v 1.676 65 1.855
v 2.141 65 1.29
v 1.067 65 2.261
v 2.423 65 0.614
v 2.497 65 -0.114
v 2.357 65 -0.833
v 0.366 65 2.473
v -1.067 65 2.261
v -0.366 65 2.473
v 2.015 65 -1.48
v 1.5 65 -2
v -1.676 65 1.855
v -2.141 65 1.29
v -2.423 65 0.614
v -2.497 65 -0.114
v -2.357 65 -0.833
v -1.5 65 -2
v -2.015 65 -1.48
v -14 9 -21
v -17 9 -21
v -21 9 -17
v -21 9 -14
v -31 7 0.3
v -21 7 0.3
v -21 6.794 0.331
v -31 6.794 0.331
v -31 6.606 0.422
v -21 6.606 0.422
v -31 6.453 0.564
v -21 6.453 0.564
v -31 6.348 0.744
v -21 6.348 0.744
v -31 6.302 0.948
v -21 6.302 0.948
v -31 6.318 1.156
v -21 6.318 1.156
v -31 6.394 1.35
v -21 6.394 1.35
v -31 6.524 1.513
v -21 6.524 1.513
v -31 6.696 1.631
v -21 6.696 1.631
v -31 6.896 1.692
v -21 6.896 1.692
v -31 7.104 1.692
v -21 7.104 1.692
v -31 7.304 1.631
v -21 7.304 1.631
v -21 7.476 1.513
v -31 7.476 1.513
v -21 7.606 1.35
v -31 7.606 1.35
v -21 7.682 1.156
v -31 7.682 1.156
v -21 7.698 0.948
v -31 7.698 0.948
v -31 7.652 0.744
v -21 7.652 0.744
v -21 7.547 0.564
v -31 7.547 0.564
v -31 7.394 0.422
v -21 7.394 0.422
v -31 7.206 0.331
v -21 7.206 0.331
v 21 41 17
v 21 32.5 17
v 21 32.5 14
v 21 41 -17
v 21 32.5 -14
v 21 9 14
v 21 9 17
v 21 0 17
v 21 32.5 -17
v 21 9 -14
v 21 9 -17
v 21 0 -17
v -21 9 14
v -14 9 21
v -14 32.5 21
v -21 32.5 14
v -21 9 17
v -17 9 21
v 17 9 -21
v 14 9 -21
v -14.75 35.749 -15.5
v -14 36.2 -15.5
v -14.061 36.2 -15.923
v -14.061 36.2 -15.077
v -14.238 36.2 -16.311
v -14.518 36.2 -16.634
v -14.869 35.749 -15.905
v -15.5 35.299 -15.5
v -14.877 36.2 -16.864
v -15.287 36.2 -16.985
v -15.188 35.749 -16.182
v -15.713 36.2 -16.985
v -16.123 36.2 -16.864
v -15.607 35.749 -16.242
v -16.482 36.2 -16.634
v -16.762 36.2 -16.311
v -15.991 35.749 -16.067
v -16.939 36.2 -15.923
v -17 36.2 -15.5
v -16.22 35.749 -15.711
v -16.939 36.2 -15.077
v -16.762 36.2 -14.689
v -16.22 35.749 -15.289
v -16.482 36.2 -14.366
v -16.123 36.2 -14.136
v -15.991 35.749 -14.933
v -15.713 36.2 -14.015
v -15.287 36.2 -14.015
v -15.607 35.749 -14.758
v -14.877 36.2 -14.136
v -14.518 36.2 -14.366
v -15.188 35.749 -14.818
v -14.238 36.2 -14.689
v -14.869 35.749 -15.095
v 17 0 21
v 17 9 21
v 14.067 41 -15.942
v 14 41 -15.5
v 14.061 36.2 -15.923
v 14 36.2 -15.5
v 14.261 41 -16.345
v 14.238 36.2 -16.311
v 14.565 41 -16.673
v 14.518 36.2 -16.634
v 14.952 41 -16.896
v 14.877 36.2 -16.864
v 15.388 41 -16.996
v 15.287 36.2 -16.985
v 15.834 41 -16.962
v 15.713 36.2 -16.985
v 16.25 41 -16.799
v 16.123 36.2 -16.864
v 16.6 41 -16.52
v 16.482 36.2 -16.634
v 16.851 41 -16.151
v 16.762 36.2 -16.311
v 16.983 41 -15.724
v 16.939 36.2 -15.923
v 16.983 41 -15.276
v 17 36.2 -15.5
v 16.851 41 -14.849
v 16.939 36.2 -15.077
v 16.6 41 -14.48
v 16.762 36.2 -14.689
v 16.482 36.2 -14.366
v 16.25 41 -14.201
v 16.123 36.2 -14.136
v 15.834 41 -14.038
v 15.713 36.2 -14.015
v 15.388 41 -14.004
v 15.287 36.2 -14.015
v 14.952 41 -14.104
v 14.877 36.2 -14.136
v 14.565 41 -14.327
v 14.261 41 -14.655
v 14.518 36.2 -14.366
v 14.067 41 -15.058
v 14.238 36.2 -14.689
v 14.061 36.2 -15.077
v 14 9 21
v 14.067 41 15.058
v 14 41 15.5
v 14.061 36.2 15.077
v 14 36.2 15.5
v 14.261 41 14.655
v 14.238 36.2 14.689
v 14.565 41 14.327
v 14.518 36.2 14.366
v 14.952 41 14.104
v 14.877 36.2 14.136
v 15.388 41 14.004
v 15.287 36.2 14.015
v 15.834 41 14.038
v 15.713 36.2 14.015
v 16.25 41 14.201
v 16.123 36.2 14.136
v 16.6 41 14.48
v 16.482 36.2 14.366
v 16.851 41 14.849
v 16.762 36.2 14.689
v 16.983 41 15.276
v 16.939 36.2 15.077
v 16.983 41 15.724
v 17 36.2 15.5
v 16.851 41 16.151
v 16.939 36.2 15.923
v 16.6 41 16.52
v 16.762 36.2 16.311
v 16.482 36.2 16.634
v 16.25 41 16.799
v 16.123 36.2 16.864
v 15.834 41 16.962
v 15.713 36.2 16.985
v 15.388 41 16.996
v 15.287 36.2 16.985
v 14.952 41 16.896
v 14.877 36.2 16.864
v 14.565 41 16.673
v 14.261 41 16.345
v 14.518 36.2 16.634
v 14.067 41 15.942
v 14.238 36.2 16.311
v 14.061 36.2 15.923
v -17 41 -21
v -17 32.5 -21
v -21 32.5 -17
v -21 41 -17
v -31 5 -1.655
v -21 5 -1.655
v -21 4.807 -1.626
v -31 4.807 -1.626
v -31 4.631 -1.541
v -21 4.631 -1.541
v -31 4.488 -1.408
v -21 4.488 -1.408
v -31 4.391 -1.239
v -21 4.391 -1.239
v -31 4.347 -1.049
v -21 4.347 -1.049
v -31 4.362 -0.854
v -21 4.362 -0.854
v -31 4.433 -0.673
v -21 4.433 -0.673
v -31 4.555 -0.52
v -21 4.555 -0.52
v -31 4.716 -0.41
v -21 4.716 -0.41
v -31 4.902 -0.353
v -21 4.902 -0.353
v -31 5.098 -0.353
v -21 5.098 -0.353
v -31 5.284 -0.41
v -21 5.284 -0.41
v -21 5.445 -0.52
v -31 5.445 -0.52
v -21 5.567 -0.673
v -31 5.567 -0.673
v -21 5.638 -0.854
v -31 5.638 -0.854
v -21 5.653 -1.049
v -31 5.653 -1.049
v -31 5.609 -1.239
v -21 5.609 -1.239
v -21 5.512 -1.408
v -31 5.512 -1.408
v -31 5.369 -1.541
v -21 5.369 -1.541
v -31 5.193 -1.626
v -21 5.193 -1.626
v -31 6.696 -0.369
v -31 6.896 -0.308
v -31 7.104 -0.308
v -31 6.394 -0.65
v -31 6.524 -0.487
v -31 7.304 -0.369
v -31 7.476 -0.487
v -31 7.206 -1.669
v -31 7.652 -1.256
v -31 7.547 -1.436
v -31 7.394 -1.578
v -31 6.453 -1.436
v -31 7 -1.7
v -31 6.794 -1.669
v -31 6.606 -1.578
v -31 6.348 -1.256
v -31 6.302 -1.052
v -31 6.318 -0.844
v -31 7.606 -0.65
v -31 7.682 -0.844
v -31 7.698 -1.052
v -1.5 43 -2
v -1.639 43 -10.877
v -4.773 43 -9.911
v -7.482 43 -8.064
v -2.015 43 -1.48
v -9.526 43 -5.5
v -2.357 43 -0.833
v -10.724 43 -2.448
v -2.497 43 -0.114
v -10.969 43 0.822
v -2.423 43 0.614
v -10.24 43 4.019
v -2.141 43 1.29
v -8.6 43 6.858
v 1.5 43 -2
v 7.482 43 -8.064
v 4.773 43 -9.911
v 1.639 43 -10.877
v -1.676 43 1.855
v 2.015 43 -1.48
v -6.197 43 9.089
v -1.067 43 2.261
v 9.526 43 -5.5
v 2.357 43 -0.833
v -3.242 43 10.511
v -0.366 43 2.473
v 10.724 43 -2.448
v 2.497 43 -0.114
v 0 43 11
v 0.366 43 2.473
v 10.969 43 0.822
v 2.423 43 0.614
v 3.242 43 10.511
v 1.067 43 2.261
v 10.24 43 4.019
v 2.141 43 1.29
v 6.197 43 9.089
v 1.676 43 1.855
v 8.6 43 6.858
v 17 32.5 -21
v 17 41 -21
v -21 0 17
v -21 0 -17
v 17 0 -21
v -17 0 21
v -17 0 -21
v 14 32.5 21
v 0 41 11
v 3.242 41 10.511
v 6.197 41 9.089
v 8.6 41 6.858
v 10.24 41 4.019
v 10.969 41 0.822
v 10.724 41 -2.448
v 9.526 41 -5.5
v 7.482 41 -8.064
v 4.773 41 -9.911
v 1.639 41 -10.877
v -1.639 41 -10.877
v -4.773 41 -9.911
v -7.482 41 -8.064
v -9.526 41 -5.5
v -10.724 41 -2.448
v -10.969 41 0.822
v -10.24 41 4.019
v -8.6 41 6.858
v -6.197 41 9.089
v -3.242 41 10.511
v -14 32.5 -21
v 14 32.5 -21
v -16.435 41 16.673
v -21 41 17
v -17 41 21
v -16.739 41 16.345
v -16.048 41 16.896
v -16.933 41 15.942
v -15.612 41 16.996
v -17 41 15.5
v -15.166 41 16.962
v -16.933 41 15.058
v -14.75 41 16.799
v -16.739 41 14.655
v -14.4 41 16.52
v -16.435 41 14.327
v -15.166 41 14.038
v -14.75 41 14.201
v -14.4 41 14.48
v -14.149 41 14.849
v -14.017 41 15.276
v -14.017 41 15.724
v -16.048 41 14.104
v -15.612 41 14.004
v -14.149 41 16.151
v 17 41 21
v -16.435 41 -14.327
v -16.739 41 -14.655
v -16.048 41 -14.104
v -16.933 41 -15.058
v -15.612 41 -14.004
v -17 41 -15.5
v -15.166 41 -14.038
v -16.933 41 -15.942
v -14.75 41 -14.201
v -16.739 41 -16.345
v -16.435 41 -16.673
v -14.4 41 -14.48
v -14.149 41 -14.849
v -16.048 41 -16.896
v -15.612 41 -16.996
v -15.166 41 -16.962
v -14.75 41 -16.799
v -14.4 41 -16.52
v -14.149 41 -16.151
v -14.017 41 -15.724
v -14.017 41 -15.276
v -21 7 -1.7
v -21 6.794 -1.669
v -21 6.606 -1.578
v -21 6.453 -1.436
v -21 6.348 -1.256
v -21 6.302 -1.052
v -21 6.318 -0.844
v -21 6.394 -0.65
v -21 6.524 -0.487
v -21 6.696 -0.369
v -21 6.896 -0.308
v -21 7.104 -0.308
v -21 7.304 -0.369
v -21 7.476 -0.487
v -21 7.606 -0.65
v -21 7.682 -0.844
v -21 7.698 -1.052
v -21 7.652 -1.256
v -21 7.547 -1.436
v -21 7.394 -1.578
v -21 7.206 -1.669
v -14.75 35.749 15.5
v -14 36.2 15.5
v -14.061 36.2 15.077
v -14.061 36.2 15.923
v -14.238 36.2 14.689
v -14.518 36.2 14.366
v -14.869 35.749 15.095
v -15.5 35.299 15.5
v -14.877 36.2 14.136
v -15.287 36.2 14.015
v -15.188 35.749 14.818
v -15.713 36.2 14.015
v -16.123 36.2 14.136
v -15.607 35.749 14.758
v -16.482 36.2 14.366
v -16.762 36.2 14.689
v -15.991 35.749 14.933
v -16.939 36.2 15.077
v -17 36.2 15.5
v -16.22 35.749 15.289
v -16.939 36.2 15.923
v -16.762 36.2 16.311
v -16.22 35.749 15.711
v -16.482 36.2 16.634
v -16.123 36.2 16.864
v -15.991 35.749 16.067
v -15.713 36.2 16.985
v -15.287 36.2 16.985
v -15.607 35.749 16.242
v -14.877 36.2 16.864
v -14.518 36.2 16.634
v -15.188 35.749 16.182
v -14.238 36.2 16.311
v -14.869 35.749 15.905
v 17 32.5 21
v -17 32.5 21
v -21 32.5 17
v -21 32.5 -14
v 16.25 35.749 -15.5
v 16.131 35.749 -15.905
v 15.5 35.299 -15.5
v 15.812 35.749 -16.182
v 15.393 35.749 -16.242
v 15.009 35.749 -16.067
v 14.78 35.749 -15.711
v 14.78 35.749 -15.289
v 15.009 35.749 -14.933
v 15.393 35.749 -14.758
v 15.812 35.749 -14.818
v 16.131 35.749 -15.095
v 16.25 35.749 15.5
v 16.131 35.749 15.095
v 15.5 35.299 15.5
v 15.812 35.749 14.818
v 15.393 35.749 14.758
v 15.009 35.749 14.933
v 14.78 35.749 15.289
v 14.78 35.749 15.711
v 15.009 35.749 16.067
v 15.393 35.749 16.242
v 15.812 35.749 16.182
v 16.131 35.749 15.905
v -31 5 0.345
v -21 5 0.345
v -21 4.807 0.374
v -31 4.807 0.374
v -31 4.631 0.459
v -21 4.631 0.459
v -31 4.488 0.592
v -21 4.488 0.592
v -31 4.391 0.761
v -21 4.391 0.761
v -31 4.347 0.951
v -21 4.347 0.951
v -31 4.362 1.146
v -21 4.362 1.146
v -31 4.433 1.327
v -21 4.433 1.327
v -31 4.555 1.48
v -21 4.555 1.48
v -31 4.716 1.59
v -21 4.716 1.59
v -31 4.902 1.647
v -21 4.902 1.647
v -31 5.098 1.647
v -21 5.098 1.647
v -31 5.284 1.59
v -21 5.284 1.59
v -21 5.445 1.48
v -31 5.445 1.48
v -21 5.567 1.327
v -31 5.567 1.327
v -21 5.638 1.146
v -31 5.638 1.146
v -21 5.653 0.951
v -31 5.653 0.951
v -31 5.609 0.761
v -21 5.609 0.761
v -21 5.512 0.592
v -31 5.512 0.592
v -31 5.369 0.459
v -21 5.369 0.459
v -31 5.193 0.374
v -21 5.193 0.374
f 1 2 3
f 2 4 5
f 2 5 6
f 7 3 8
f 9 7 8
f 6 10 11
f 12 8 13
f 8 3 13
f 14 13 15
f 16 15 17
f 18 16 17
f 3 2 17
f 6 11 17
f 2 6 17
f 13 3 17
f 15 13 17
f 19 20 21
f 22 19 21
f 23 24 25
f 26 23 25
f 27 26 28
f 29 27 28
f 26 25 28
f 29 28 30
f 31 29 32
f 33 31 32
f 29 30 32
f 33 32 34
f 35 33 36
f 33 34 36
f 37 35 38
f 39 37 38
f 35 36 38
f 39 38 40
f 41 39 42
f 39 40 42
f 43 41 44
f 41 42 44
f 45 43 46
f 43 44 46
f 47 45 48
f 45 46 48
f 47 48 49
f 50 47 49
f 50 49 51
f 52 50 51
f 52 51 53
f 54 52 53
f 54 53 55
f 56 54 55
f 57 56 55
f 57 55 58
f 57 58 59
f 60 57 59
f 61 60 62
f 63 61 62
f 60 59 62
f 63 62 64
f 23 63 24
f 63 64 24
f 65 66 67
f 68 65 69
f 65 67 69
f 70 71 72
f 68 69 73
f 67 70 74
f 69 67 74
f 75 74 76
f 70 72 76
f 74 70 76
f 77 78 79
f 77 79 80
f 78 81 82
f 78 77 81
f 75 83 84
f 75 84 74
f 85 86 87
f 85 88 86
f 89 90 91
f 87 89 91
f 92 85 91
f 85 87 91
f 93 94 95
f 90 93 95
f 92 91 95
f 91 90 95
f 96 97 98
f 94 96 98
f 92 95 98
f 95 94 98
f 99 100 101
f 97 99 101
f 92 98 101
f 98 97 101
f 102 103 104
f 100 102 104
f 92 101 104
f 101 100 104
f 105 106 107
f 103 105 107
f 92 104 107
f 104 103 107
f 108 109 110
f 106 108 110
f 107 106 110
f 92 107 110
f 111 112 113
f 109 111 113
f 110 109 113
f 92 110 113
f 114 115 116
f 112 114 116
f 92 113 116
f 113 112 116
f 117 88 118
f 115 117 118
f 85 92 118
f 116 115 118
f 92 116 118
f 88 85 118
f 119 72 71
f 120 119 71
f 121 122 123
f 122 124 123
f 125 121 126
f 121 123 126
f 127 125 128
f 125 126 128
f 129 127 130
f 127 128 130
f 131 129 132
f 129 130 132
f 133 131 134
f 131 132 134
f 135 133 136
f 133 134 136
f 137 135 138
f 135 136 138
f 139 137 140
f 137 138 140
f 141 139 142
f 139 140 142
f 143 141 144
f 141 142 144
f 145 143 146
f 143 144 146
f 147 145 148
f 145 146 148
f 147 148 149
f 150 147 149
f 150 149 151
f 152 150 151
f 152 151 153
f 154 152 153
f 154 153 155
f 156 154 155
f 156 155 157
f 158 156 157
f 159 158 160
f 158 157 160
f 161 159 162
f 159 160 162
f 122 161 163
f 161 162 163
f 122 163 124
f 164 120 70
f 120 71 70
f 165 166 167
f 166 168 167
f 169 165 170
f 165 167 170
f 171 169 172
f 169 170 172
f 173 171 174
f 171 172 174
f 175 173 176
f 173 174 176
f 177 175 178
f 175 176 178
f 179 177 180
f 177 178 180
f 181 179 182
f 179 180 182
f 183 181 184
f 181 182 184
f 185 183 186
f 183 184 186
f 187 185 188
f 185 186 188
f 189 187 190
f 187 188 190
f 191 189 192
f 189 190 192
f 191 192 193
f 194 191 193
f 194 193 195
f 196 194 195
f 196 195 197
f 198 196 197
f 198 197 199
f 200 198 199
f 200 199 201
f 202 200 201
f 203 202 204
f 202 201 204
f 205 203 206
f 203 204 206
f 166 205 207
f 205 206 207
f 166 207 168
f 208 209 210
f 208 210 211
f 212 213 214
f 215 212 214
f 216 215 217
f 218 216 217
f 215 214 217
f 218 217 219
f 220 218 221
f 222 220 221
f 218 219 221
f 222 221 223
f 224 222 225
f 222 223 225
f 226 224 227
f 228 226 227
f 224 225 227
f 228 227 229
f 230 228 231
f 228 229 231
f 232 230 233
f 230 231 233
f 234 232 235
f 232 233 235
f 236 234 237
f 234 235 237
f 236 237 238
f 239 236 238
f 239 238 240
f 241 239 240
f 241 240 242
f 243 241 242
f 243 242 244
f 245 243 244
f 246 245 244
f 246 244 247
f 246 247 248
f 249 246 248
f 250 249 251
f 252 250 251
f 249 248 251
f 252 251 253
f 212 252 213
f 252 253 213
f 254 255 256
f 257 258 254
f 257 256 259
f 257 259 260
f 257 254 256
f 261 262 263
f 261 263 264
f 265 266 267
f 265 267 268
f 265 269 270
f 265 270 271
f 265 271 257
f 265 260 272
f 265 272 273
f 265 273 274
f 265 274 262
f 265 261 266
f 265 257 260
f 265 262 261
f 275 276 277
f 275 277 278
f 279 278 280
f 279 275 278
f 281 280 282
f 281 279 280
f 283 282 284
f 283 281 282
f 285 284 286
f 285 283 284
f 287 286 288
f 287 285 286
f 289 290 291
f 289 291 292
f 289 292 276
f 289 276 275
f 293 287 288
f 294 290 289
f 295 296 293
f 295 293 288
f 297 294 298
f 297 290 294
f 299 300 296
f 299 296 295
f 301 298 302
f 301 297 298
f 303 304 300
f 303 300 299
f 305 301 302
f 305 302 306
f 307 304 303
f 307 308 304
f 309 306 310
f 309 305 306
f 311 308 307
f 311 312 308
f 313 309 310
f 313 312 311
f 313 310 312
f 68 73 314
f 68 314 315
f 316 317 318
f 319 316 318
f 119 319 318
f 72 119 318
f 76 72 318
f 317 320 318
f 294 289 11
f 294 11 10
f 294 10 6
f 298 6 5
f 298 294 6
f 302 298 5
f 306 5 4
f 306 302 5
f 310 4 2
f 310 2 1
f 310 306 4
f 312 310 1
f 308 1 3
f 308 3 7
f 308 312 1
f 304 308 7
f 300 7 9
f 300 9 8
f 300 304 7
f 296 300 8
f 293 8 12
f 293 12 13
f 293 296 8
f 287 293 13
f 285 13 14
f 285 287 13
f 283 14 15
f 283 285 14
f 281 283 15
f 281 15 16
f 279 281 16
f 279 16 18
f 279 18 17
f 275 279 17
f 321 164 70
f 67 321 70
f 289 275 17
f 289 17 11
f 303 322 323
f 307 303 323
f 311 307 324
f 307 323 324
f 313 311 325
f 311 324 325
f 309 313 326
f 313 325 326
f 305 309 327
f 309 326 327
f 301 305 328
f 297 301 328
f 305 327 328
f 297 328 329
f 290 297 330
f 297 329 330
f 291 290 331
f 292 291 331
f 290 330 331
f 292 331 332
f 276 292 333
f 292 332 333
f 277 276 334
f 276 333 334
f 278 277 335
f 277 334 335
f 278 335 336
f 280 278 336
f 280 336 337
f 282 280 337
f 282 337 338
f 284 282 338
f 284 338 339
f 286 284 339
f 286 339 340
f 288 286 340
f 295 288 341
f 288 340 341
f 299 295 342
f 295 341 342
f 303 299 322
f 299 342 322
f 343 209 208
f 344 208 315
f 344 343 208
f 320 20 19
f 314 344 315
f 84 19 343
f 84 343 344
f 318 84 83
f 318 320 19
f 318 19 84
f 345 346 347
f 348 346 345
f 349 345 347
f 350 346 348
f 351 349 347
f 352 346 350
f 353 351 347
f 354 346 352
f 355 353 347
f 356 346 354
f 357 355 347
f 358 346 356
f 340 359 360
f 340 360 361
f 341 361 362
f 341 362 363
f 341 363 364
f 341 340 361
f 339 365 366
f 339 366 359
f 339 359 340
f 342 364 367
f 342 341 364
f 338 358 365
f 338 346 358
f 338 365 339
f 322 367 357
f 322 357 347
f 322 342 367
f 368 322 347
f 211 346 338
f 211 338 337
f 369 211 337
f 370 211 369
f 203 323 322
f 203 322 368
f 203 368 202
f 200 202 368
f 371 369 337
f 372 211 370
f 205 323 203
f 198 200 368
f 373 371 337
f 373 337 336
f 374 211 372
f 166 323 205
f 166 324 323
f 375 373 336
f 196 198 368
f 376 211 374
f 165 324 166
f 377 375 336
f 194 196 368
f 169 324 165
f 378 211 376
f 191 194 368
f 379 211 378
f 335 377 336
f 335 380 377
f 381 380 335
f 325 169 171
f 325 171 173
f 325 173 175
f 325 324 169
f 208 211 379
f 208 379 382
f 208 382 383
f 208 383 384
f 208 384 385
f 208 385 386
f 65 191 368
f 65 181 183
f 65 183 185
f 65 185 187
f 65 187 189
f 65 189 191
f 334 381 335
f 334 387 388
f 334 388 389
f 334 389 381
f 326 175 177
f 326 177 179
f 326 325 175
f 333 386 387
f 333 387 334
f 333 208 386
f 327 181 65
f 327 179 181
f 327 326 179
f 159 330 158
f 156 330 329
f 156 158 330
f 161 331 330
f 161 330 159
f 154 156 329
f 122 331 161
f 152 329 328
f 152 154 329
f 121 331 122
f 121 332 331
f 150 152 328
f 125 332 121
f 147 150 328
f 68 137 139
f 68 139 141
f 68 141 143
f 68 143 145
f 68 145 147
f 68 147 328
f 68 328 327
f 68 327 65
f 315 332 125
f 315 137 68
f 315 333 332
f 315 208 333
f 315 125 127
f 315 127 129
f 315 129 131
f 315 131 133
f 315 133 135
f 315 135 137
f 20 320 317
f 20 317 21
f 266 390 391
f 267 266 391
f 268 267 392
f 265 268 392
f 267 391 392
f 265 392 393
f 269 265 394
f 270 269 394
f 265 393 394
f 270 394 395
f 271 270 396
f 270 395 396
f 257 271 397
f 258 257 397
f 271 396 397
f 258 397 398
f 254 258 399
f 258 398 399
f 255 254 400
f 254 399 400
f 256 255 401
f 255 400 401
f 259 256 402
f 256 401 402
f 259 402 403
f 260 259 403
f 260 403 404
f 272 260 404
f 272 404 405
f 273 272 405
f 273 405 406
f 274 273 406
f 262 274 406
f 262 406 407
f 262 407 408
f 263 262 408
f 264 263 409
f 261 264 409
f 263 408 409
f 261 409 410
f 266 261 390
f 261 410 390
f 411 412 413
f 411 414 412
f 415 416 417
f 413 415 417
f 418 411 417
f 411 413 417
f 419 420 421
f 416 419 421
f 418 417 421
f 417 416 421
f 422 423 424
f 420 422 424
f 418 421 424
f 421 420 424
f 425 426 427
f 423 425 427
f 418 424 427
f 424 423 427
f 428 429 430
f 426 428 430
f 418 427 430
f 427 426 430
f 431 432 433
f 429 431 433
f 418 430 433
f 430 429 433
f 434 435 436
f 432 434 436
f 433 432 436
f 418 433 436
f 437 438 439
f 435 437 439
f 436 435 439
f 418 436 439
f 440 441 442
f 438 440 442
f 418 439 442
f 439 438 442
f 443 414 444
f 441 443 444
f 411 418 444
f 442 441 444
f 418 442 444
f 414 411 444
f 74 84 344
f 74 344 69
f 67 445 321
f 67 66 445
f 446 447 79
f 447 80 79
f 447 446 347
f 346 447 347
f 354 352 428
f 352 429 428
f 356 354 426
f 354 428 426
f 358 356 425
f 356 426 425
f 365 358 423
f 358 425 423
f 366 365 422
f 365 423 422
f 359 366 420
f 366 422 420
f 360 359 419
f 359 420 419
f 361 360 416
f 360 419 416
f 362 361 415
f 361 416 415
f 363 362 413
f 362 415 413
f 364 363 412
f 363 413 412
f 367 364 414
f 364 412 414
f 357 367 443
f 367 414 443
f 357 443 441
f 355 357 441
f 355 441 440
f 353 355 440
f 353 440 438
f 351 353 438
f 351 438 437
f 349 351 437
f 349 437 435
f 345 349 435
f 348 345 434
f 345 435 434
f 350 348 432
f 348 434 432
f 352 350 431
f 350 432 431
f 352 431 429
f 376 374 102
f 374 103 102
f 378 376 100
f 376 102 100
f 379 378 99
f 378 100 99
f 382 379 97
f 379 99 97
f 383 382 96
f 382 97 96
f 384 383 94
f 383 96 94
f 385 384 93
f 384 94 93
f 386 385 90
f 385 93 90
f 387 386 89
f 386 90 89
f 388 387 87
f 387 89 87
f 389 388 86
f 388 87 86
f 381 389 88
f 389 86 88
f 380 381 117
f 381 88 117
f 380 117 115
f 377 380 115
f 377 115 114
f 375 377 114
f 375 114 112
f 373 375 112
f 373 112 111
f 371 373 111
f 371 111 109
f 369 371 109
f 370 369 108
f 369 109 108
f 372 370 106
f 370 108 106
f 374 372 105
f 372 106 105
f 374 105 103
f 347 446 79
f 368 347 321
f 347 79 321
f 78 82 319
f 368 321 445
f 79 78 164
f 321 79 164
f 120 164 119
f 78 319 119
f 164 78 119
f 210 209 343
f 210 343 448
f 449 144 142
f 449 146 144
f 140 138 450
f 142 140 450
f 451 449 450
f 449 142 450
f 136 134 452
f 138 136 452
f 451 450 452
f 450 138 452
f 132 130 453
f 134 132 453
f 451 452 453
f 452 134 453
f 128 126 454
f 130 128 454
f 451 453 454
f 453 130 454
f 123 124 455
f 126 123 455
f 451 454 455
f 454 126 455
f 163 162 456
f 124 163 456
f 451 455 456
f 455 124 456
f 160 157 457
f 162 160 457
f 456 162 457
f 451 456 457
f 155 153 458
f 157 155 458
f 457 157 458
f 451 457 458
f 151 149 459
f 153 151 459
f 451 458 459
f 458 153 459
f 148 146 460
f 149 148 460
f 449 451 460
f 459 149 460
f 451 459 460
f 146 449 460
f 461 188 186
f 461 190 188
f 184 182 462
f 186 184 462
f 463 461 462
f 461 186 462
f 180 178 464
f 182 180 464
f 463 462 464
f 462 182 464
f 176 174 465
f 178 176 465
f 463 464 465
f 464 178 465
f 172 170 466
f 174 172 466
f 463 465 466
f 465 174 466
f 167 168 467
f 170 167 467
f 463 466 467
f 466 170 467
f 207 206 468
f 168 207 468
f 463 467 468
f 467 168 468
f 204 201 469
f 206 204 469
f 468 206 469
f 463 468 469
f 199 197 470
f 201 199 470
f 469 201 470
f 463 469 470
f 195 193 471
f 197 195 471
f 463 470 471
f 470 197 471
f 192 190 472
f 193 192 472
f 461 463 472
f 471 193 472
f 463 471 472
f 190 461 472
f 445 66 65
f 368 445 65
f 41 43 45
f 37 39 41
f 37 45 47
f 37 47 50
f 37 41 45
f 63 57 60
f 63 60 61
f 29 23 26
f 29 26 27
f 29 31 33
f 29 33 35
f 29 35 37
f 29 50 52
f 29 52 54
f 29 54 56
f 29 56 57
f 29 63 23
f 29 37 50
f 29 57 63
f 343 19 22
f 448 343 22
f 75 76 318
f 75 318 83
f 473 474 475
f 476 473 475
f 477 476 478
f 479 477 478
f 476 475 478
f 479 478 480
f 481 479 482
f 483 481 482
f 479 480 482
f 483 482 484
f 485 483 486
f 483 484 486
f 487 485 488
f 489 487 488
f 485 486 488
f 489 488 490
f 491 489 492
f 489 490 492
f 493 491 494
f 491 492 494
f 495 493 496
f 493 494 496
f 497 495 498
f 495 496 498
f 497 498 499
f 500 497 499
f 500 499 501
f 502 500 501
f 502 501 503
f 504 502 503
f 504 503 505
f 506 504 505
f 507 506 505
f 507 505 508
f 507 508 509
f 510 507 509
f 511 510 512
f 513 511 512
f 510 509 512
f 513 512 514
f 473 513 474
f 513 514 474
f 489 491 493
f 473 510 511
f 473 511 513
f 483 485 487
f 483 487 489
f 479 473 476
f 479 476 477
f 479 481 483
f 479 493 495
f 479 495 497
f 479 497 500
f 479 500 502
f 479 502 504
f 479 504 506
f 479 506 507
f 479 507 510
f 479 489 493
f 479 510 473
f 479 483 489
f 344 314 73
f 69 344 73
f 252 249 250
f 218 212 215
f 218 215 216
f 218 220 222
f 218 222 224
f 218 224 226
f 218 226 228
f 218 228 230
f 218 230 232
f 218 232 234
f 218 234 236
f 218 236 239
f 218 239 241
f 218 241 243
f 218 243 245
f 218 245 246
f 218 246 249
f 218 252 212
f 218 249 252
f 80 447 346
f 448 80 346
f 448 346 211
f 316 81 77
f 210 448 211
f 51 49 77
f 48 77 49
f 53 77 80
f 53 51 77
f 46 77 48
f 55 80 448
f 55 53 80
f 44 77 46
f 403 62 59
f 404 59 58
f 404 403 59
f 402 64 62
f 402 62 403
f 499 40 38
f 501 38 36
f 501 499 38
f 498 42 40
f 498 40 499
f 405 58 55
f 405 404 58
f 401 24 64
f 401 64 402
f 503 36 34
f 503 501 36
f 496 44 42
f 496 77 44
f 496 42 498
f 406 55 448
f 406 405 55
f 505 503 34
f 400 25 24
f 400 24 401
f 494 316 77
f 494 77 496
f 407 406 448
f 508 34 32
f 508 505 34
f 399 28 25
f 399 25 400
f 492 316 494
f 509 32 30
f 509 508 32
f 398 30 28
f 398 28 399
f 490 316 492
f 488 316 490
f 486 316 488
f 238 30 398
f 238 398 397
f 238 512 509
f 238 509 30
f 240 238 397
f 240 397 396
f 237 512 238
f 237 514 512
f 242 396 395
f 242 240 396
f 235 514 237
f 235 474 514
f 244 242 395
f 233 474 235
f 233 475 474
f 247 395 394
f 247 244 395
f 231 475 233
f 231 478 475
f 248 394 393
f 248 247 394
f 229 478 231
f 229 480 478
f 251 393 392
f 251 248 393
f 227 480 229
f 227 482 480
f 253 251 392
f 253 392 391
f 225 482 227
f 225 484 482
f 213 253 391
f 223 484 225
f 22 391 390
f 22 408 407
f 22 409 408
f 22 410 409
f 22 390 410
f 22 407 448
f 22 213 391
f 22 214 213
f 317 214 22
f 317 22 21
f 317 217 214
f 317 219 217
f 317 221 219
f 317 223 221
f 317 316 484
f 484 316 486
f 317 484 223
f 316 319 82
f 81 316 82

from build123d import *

# Parameters (mm, degrees)
ESQUISSE1_W                       = 42
ESQUISSE1_H                       = 42
BOSS_EXTRU_1_DEPTH                = 41
ESQUISSE2_R                       = 11
BOSS_EXTRU_2_DEPTH                = 2
BOSS_EXTRU_3_DEPTH                = 22
DIAM_TRE_DU_PER_AGE_3_0_3_1_D     = 3
DIAM_TRE_DU_PER_AGE_3_0_3_1_DEPTH = 4.8
DIAM_TRE_DU_PER_AGE_3_0_3_1_TIP   = 0.901290929
CHANFREIN1_SIZE                   = 4
ENL_V_START                       = 9
ENL_V_MAT_EXTRU_1_DEPTH           = 23.5
ESQUISSE5_R                       = 0.7
ESQUISSE5_R_2                     = 0.654723083
BOSS_EXTRU_4_DEPTH                = 10


with BuildPart() as part:
    # Esquisse1 → Boss.-Extru.1 (new body)
    with BuildSketch(Plane(origin=(0, 0, 0), x_dir=(1, 0, 0), z_dir=(0, 1, 0))):
        Rectangle(ESQUISSE1_W, ESQUISSE1_H)
    extrude(amount=BOSS_EXTRU_1_DEPTH)

    # Esquisse2 → Boss.-Extru.2 (add)
    with BuildSketch(Plane(origin=(0, 41, 0), x_dir=(1, 0, 0), z_dir=(0, 1, 0))):
        with Locations(Location((0, 0, 0), (0, 0, 270))):
            Circle(ESQUISSE2_R)
    extrude(amount=BOSS_EXTRU_2_DEPTH)

    # Esquisse3 → Boss.-Extru.3 (add)
    with BuildSketch(Plane(origin=(0, 43, 0), x_dir=(1, 0, 0), z_dir=(0, 1, 0))):
        with BuildLine():
            Line((-1.5, 2), (1.5, 2))
            ThreePointArc((1.5, 2), (0, -2.5), (-1.5, 2))
        make_face()
    extrude(amount=BOSS_EXTRU_3_DEPTH)

    # Diamètre du perçage Ø3.0 (3)1
    with Locations(Plane(origin=(0, 41, 0), x_dir=(1, 0, 0), z_dir=(0, 1, 0))):
        with Locations((-15.5, 15.5), (15.5, 15.5), (15.5, -15.5), (-15.5, -15.5)):
            Hole(DIAM_TRE_DU_PER_AGE_3_0_3_1_D / 2, depth=DIAM_TRE_DU_PER_AGE_3_0_3_1_DEPTH)
            with Locations((0, 0, -(DIAM_TRE_DU_PER_AGE_3_0_3_1_DEPTH + DIAM_TRE_DU_PER_AGE_3_0_3_1_TIP / 2))):  # 118° drill point
                Cone(0, DIAM_TRE_DU_PER_AGE_3_0_3_1_D / 2, DIAM_TRE_DU_PER_AGE_3_0_3_1_TIP, mode=Mode.SUBTRACT)

    # Chanfrein1
    chanfrein1_edges = [part.edges().sort_by_distance(p)[0] for p in [
        (-21, 20.5, -21),
        (21, 20.5, -21),
        (21, 20.5, 21),
        (-21, 20.5, 21),
    ]]
    chamfer(chanfrein1_edges, length=CHANFREIN1_SIZE)

    # Esquisse4 → Enlèv. mat.-Extru.1 (cut)
    with BuildSketch(Plane(origin=(0, 0, 0), x_dir=(1, 0, 0), z_dir=(0, 1, 0)).offset(ENL_V_START)):
        Polygon((-14, 21), (-21, 14), (-21, 21), align=None)
        Polygon((21, 21), (14, 21), (21, 14), align=None)
        Polygon((14, -21), (21, -14), (21, -21), align=None)
        Polygon((-21, -21), (-14, -21), (-21, -14), align=None)
    extrude(amount=ENL_V_MAT_EXTRU_1_DEPTH, mode=Mode.SUBTRACT)

    # Esquisse5 → Boss.-Extru.4 (add)
    with BuildSketch(Plane.ZY.offset(21)):
        with Locations(Location((-1, 7, 0), (0, 0, 180))):
            Circle(ESQUISSE5_R)
        with Locations(Location((-1, 5, 0), (0, 0, 180))):
            Circle(ESQUISSE5_R_2)
        with Locations(Location((1, 5, 0), (0, 0, 180))):
            Circle(ESQUISSE5_R_2)
        with Locations(Location((1, 7, 0), (0, 0, 180))):
            Circle(ESQUISSE5_R)
    extrude(amount=BOSS_EXTRU_4_DEPTH)


solid = part.part
